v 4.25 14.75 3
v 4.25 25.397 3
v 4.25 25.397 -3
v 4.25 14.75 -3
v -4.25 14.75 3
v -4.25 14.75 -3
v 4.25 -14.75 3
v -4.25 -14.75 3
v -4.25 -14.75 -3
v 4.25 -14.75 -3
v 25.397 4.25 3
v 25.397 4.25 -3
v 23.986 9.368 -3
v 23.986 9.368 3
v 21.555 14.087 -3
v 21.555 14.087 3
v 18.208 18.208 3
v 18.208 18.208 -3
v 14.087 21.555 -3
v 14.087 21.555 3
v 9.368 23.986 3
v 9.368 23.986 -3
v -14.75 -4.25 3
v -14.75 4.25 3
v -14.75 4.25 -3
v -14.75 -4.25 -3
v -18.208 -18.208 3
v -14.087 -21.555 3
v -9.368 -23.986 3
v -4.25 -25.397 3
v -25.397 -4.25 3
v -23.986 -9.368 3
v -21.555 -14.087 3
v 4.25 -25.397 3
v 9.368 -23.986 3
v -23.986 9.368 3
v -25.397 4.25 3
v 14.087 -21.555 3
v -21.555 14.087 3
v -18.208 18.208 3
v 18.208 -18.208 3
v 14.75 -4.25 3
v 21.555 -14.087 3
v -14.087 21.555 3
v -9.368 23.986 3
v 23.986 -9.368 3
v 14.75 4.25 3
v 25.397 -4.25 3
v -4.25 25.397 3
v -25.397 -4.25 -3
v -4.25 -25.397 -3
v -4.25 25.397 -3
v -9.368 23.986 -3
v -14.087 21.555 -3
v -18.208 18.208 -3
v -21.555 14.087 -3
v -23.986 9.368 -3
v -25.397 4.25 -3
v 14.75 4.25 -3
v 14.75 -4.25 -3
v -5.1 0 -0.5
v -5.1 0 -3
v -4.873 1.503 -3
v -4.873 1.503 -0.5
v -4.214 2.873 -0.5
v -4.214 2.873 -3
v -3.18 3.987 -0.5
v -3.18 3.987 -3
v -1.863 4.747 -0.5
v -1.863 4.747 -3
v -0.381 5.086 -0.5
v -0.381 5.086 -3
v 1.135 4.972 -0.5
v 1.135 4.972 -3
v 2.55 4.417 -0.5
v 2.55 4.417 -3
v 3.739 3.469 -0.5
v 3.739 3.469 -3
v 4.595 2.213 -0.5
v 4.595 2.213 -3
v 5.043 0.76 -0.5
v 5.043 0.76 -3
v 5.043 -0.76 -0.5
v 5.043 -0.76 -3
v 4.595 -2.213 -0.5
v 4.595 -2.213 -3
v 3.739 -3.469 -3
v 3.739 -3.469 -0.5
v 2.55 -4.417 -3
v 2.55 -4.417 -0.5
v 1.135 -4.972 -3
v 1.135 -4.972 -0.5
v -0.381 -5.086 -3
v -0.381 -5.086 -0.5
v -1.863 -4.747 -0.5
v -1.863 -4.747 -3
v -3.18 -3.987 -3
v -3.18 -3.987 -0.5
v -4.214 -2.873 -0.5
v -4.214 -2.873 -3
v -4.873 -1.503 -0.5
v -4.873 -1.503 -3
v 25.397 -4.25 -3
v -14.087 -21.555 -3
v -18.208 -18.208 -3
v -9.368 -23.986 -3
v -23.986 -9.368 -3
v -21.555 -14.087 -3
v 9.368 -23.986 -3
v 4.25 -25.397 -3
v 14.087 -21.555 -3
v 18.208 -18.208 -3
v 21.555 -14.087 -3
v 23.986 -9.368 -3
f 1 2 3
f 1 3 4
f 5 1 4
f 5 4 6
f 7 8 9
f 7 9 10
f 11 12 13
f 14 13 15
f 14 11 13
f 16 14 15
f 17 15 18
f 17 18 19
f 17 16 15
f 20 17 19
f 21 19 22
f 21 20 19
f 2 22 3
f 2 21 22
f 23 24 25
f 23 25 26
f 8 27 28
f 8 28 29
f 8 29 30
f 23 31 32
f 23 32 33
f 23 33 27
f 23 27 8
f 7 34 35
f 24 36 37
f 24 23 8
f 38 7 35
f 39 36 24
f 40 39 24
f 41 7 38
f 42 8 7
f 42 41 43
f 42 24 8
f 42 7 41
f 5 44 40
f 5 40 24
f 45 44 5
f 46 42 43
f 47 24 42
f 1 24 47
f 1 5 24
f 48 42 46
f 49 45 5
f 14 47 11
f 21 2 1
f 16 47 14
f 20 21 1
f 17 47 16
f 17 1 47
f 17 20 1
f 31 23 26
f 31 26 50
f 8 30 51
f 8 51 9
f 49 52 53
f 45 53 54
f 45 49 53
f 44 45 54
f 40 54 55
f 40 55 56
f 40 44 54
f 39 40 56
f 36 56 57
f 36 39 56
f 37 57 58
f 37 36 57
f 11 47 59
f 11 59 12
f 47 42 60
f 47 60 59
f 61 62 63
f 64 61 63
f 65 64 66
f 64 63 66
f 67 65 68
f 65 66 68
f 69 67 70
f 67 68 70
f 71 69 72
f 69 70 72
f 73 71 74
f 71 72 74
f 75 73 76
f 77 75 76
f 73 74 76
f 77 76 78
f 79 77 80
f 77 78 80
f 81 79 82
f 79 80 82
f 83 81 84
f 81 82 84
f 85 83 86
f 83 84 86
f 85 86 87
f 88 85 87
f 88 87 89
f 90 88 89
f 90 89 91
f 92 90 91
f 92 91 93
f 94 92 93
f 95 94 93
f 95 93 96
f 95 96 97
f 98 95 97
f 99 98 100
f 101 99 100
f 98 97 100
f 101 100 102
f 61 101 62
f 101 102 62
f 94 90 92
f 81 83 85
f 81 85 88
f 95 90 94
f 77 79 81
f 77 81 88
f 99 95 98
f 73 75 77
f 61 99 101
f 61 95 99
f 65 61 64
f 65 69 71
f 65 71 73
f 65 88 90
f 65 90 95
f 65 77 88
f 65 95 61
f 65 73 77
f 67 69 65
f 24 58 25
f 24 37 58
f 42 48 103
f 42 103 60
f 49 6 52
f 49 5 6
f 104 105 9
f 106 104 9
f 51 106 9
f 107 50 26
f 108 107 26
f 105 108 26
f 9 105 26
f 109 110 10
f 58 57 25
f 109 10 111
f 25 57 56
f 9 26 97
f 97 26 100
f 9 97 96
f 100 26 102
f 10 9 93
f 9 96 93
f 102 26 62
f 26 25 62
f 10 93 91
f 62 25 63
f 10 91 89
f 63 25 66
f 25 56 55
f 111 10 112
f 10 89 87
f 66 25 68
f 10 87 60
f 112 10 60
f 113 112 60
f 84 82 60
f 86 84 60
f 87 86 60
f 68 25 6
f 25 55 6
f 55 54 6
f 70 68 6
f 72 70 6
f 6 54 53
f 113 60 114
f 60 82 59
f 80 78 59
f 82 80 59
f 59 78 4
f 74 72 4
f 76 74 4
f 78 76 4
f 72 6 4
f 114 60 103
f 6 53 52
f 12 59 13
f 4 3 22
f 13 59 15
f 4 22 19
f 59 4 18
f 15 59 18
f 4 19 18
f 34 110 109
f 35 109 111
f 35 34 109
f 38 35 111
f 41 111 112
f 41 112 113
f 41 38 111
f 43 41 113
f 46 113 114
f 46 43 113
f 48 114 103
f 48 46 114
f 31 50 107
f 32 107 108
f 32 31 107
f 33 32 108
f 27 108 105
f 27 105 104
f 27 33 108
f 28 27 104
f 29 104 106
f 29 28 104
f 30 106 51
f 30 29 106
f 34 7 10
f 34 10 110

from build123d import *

# Parameters (mm, degrees)
BOSS_EXTRUDE1_DEPTH = 3
SKETCH3_R           = 5.1
CUT_EXTRUDE1_DEPTH  = 2.5


with BuildPart() as part:
    # Sketch2 → Boss-Extrude1 (new, symmetric)
    with BuildSketch(Plane.XY):
        with BuildLine():
            Line((-25.396850198, 4.25), (-14.75, 4.25))
            Line((-14.75, 4.25), (-14.75, -4.25))
            Line((-14.75, -4.25), (-25.396850198, -4.25))
            ThreePointArc((-25.396850198, -4.25), (-18.207999616, -18.207999616), (-4.25, -25.396850198))
            Line((-4.25, -25.396850198), (-4.25, -14.75))
            Line((-4.25, -14.75), (4.25, -14.75))
            Line((4.25, -14.75), (4.25, -25.396850198))
            ThreePointArc((4.25, -25.396850198), (18.207999616, -18.207999616), (25.396850198, -4.25))
            Line((25.396850198, -4.25), (14.75, -4.25))
            Line((14.75, -4.25), (14.75, 4.25))
            Line((14.75, 4.25), (25.396850198, 4.25))
            ThreePointArc((25.396850198, 4.25), (18.207999616, 18.207999616), (4.25, 25.396850198))
            Line((4.25, 25.396850198), (4.25, 14.75))
            Line((4.25, 14.75), (-4.25, 14.75))
            Line((-4.25, 14.75), (-4.25, 25.396850198))
            ThreePointArc((-4.25, 25.396850198), (-18.207999616, 18.207999616), (-25.396850198, 4.25))
        make_face()
    extrude(amount=BOSS_EXTRUDE1_DEPTH, both=True)

    # Sketch3 → Cut-Extrude1 (cut)
    with BuildSketch(Plane(origin=(0, 0, -3), x_dir=(-1, 0, 0), z_dir=(0, 0, -1))):
        Circle(SKETCH3_R)
    extrude(amount=-CUT_EXTRUDE1_DEPTH, mode=Mode.SUBTRACT)


solid = part.part
